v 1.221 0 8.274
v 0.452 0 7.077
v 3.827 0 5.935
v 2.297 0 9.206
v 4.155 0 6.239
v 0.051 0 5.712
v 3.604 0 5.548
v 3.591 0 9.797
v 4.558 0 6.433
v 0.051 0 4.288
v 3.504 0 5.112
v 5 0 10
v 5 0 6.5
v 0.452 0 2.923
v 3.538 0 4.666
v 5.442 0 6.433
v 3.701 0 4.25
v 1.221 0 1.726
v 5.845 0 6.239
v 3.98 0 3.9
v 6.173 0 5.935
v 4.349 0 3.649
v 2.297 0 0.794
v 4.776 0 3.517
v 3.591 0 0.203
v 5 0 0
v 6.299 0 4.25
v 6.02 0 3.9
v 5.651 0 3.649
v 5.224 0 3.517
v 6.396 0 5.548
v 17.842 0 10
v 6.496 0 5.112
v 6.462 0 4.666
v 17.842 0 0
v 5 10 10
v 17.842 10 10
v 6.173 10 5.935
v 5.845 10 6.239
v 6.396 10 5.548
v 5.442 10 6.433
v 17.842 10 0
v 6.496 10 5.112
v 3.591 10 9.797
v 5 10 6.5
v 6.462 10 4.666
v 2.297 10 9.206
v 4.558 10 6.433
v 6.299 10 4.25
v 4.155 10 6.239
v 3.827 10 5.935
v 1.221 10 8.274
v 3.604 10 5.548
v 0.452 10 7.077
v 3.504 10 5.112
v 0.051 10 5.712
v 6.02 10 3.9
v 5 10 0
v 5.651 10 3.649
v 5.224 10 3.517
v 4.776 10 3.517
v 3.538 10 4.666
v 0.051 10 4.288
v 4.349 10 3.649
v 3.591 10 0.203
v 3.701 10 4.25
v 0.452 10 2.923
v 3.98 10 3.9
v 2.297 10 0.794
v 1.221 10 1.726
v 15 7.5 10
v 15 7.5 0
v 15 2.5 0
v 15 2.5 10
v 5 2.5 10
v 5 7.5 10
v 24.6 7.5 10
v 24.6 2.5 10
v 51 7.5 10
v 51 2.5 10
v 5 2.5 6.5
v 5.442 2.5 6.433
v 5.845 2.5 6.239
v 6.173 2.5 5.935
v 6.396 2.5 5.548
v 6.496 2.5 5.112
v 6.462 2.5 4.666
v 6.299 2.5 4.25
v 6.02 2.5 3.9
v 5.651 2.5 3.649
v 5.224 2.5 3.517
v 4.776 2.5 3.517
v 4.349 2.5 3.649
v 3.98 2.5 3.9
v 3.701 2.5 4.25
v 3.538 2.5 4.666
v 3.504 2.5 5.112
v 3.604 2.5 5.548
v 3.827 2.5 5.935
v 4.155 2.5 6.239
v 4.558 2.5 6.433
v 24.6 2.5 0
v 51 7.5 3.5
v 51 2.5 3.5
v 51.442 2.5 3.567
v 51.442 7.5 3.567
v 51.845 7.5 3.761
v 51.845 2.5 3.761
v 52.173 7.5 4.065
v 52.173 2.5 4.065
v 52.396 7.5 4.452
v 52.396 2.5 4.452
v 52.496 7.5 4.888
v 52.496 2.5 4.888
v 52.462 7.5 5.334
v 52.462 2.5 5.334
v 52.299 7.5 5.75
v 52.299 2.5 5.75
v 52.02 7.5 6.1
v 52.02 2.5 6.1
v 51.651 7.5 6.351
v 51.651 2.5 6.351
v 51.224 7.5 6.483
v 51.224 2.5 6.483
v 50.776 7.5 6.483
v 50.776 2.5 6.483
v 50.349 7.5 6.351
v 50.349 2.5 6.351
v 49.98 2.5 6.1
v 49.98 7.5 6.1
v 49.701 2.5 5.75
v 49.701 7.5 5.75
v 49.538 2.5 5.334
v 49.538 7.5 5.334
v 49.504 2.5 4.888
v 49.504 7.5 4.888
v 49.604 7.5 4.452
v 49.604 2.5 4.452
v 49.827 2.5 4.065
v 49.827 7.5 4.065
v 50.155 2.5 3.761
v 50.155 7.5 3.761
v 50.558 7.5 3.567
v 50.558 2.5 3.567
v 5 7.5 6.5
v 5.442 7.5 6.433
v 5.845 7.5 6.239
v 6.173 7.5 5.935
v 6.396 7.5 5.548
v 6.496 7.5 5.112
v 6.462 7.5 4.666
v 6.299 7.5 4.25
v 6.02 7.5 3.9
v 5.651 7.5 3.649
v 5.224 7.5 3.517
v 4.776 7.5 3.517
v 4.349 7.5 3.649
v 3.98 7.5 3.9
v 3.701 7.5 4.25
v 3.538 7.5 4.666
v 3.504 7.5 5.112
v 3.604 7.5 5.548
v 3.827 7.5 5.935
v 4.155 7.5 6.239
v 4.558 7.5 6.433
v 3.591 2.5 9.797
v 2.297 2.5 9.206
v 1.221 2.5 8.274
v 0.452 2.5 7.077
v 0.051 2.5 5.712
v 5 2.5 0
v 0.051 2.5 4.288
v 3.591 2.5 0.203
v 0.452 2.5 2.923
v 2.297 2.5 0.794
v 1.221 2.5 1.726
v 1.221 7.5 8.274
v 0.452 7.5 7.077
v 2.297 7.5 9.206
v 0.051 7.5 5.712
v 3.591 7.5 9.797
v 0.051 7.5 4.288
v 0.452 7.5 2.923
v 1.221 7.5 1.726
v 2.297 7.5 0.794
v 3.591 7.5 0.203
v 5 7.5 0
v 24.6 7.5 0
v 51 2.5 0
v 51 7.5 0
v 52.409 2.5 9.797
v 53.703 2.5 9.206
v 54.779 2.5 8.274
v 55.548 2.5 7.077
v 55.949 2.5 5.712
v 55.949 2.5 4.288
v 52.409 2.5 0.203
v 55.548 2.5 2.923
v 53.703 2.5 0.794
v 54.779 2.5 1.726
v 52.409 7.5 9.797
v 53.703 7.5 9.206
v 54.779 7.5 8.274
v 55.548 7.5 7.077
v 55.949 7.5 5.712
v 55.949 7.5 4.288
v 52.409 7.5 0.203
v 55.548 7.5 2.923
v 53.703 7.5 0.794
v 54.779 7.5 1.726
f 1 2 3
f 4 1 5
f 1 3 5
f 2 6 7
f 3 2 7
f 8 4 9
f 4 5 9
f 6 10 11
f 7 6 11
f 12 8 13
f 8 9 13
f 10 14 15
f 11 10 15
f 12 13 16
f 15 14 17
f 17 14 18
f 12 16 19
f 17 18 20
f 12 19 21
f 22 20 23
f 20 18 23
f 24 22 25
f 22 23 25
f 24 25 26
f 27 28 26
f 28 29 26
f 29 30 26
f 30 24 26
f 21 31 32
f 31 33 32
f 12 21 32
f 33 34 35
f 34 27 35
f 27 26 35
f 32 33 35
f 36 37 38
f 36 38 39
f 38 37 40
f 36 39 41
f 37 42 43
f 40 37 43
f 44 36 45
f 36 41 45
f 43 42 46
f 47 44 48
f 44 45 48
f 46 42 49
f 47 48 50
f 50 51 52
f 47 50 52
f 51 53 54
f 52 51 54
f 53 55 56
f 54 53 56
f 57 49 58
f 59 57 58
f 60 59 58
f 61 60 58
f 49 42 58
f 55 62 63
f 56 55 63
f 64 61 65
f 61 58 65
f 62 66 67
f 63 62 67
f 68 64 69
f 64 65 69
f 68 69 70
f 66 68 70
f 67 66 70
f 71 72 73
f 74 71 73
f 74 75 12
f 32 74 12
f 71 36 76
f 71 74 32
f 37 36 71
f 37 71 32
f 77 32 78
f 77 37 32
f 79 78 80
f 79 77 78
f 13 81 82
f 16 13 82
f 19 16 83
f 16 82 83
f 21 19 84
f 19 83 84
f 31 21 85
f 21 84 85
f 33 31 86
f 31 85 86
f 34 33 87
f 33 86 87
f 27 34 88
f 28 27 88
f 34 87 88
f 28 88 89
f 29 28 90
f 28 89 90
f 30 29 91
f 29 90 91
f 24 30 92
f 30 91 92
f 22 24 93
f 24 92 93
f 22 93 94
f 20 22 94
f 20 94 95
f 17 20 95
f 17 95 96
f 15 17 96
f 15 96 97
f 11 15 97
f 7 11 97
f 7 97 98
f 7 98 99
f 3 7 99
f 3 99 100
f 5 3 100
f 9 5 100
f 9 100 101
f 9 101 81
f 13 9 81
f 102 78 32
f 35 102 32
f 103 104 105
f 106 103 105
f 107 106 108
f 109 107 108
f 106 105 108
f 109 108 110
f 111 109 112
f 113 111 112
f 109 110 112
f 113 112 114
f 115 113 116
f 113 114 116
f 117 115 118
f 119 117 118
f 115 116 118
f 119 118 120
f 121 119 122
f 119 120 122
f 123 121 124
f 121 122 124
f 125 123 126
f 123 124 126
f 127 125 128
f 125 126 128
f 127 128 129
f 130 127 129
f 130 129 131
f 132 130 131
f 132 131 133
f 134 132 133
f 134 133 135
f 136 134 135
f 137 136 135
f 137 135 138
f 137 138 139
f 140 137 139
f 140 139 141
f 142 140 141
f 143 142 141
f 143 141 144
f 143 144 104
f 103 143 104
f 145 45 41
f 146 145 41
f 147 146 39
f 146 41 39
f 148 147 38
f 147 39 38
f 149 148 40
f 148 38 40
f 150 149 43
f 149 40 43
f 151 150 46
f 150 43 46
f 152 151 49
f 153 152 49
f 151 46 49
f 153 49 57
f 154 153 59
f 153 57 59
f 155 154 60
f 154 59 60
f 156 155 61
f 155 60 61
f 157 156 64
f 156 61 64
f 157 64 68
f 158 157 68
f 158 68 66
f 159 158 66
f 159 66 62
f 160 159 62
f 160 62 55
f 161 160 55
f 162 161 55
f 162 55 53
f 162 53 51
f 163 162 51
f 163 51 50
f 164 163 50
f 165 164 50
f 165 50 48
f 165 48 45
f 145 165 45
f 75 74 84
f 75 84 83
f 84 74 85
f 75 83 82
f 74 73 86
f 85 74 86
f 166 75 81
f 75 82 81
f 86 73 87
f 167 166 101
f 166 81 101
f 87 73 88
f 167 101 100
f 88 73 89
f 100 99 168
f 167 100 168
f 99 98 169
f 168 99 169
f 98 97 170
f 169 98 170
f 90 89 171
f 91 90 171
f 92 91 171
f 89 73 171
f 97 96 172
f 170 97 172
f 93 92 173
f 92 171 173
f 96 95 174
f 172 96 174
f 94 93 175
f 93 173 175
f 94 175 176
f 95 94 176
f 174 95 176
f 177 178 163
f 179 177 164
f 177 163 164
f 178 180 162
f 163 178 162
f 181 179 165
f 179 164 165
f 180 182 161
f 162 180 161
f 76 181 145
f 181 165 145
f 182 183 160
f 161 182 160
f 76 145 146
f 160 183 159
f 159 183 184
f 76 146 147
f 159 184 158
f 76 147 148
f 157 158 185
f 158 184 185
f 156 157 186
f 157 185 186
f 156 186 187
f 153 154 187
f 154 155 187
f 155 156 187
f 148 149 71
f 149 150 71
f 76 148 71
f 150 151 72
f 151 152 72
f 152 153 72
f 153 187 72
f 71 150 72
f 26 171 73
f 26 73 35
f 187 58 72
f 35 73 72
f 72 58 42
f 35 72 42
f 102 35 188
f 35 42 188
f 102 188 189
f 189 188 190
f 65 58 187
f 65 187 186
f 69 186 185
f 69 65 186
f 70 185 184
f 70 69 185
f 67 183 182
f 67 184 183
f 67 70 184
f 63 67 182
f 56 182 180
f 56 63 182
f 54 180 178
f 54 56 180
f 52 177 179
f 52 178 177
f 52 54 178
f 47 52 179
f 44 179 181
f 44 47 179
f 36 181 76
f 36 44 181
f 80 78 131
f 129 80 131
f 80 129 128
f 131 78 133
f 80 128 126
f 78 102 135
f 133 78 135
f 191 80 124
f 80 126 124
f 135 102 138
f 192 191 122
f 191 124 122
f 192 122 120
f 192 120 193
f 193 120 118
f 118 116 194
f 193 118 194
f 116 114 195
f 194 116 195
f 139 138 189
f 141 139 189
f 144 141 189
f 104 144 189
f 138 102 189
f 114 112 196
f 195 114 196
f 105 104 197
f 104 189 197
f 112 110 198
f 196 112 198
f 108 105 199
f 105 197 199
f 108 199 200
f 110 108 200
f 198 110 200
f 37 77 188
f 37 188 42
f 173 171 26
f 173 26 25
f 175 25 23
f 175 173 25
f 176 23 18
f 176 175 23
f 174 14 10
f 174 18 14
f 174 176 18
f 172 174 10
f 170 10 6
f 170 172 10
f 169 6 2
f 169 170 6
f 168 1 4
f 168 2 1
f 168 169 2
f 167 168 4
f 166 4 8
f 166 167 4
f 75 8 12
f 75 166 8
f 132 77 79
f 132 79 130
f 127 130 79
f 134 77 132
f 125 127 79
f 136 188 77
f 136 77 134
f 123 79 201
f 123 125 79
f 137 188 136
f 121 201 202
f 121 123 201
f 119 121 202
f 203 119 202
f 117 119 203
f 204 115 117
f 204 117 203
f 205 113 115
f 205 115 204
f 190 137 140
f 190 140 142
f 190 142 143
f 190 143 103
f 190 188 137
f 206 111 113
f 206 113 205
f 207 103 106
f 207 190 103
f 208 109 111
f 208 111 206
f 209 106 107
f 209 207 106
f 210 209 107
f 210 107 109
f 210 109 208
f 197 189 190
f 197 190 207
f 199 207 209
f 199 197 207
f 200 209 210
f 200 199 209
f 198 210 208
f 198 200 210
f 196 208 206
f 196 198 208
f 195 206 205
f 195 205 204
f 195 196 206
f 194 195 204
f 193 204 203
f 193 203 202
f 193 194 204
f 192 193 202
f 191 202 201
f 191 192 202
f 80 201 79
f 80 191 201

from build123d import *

# Parameters (mm, degrees)
SALIENTE_EXTRUIR1_DEPTH = 10
CROQUIS2_R              = 1.5
CORTAR_EXTRUIR1_DEPTH   = 10
CROQUIS3_W              = 15
CROQUIS3_H              = 2.5
CORTAR_EXTRUIR2_DEPTH   = 10
CROQUIS4_R              = 1.5
CORTAR_EXTRUIR3_DEPTH   = 10
CORTAR_EXTRUIR5_DEPTH   = 10
CROQUIS9_R              = 1.5
SALIENTE_EXTRUIR2_DEPTH = 2.5
CROQUIS11_R             = 1.5
CORTAR_EXTRUIR8_DEPTH   = 10
CORTAR_EXTRUIR9_DEPTH   = 58.758116313


with BuildPart() as part:
    # Croquis1 → Saliente-Extruir1 (new body)
    with BuildSketch(Plane.XY):
        Polygon((0, 0), (39.6, 0), (39.6, 2.5), (39.6, 7.5), (39.6, 10), (0, 10), (0, 7.5), (15, 7.5), (15, 2.5), (0, 2.5), align=None)
    extrude(amount=SALIENTE_EXTRUIR1_DEPTH)

    # Croquis2 → Cortar-Extruir1 (cut)
    with BuildSketch(Plane(origin=(0, 10, 0), x_dir=(1, 0, 0), z_dir=(0, 1, 0))):
        with Locations(Location((5, -5, 0), (0, 0, 270))):
            Circle(CROQUIS2_R)
        with BuildLine():
            Line((-4.031911586, 0), (5, 0))
            ThreePointArc((5, 0), (0, -5), (5, -10))
            Line((5, -10), (-4.031911586, -10))
            Line((-4.031911586, -10), (-4.031911586, 0))
        make_face()
    extrude(amount=-CORTAR_EXTRUIR1_DEPTH, mode=Mode.SUBTRACT)

    # Croquis3 → Cortar-Extruir2 (cut)
    with BuildSketch(Plane(origin=(0, 10, 0), x_dir=(1, 0, 0), z_dir=(0, 1, 0))):
        with Locations((32.1, -1.25)):
            Rectangle(CROQUIS3_W, CROQUIS3_H)
        with Locations((32.1, -8.75)):
            Rectangle(CROQUIS3_W, CROQUIS3_H)
    extrude(amount=-CORTAR_EXTRUIR2_DEPTH, mode=Mode.SUBTRACT)

    # Croquis4 → Cortar-Extruir3 (cut)
    with BuildSketch(Plane.XY.offset(7.5)):
        with Locations((34.6, 5)):
            Circle(CROQUIS4_R)
        with BuildLine():
            Line((34.6, 10), (103.004091933, 10))
            Line((103.004091933, 10), (103.004091933, 0))
            Line((103.004091933, 0), (34.6, 0))
            ThreePointArc((34.6, 0), (39.6, 5), (34.6, 10))
        make_face()
    extrude(amount=-CORTAR_EXTRUIR3_DEPTH, mode=Mode.SUBTRACT)

    # Croquis8 → Cortar-Extruir5 (cut)
    with BuildSketch(Plane.XY.offset(7.5)):
        with BuildLine():
            Line((24.6, 0), (34.6, 0))
            ThreePointArc((34.6, 0), (39.6, 5), (34.6, 10))
            Line((34.6, 10), (24.6, 10))
            Line((24.6, 10), (24.6, 0))
        make_face()
    extrude(amount=-CORTAR_EXTRUIR5_DEPTH, mode=Mode.SUBTRACT)

    # Croquis9 → Saliente-Extruir2 (add, symmetric)
    with BuildSketch(Plane(origin=(0, 5, 0), x_dir=(-1, 0, 0), z_dir=(0, -1, 0))):
        with BuildLine():
            Line((-24.6, -10), (-95, -10))
            ThreePointArc((-95, -10), (-100, -5), (-95, 0))
            Line((-95, 0), (-24.6, 0))
            Line((-24.6, 0), (-24.6, -10))
        make_face()
        with Locations(Location((-95, -5, 0), (0, 0, 90))):
            Circle(CROQUIS9_R, mode=Mode.SUBTRACT)
    extrude(amount=SALIENTE_EXTRUIR2_DEPTH, both=True)

    # Croquis11 → Cortar-Extruir8 (cut)
    with BuildSketch(Plane.XZ.offset(-2.5)):
        with Locations(Location((51, 5, 0), (0, 0, 270))):
            Circle(CROQUIS11_R)
        with BuildLine():
            Line((51, 10), (51, 16.019823118))
            Line((51, 16.019823118), (124.451684226, 16.019823118))
            Line((124.451684226, 16.019823118), (123.024656772, -12.837843177))
            Line((123.024656772, -12.837843177), (54.838697363, -9.466010019))
            Line((54.838697363, -9.466010019), (51, 0))
            ThreePointArc((51, 0), (56, 5), (51, 10))
        make_face()
    extrude(amount=-CORTAR_EXTRUIR8_DEPTH, mode=Mode.SUBTRACT)

    # Croquis12 → Cortar-Extruir9 (cut, through all)
    with BuildSketch(Plane.XY.offset(10)):
        Polygon((24.6, 7.5), (17.841989968, 10), (24.6, 10), align=None)
        Polygon((24.6, 2.5), (17.841989968, 0), (24.6, 0), align=None)
    extrude(amount=-CORTAR_EXTRUIR9_DEPTH, mode=Mode.SUBTRACT)


solid = part.part
